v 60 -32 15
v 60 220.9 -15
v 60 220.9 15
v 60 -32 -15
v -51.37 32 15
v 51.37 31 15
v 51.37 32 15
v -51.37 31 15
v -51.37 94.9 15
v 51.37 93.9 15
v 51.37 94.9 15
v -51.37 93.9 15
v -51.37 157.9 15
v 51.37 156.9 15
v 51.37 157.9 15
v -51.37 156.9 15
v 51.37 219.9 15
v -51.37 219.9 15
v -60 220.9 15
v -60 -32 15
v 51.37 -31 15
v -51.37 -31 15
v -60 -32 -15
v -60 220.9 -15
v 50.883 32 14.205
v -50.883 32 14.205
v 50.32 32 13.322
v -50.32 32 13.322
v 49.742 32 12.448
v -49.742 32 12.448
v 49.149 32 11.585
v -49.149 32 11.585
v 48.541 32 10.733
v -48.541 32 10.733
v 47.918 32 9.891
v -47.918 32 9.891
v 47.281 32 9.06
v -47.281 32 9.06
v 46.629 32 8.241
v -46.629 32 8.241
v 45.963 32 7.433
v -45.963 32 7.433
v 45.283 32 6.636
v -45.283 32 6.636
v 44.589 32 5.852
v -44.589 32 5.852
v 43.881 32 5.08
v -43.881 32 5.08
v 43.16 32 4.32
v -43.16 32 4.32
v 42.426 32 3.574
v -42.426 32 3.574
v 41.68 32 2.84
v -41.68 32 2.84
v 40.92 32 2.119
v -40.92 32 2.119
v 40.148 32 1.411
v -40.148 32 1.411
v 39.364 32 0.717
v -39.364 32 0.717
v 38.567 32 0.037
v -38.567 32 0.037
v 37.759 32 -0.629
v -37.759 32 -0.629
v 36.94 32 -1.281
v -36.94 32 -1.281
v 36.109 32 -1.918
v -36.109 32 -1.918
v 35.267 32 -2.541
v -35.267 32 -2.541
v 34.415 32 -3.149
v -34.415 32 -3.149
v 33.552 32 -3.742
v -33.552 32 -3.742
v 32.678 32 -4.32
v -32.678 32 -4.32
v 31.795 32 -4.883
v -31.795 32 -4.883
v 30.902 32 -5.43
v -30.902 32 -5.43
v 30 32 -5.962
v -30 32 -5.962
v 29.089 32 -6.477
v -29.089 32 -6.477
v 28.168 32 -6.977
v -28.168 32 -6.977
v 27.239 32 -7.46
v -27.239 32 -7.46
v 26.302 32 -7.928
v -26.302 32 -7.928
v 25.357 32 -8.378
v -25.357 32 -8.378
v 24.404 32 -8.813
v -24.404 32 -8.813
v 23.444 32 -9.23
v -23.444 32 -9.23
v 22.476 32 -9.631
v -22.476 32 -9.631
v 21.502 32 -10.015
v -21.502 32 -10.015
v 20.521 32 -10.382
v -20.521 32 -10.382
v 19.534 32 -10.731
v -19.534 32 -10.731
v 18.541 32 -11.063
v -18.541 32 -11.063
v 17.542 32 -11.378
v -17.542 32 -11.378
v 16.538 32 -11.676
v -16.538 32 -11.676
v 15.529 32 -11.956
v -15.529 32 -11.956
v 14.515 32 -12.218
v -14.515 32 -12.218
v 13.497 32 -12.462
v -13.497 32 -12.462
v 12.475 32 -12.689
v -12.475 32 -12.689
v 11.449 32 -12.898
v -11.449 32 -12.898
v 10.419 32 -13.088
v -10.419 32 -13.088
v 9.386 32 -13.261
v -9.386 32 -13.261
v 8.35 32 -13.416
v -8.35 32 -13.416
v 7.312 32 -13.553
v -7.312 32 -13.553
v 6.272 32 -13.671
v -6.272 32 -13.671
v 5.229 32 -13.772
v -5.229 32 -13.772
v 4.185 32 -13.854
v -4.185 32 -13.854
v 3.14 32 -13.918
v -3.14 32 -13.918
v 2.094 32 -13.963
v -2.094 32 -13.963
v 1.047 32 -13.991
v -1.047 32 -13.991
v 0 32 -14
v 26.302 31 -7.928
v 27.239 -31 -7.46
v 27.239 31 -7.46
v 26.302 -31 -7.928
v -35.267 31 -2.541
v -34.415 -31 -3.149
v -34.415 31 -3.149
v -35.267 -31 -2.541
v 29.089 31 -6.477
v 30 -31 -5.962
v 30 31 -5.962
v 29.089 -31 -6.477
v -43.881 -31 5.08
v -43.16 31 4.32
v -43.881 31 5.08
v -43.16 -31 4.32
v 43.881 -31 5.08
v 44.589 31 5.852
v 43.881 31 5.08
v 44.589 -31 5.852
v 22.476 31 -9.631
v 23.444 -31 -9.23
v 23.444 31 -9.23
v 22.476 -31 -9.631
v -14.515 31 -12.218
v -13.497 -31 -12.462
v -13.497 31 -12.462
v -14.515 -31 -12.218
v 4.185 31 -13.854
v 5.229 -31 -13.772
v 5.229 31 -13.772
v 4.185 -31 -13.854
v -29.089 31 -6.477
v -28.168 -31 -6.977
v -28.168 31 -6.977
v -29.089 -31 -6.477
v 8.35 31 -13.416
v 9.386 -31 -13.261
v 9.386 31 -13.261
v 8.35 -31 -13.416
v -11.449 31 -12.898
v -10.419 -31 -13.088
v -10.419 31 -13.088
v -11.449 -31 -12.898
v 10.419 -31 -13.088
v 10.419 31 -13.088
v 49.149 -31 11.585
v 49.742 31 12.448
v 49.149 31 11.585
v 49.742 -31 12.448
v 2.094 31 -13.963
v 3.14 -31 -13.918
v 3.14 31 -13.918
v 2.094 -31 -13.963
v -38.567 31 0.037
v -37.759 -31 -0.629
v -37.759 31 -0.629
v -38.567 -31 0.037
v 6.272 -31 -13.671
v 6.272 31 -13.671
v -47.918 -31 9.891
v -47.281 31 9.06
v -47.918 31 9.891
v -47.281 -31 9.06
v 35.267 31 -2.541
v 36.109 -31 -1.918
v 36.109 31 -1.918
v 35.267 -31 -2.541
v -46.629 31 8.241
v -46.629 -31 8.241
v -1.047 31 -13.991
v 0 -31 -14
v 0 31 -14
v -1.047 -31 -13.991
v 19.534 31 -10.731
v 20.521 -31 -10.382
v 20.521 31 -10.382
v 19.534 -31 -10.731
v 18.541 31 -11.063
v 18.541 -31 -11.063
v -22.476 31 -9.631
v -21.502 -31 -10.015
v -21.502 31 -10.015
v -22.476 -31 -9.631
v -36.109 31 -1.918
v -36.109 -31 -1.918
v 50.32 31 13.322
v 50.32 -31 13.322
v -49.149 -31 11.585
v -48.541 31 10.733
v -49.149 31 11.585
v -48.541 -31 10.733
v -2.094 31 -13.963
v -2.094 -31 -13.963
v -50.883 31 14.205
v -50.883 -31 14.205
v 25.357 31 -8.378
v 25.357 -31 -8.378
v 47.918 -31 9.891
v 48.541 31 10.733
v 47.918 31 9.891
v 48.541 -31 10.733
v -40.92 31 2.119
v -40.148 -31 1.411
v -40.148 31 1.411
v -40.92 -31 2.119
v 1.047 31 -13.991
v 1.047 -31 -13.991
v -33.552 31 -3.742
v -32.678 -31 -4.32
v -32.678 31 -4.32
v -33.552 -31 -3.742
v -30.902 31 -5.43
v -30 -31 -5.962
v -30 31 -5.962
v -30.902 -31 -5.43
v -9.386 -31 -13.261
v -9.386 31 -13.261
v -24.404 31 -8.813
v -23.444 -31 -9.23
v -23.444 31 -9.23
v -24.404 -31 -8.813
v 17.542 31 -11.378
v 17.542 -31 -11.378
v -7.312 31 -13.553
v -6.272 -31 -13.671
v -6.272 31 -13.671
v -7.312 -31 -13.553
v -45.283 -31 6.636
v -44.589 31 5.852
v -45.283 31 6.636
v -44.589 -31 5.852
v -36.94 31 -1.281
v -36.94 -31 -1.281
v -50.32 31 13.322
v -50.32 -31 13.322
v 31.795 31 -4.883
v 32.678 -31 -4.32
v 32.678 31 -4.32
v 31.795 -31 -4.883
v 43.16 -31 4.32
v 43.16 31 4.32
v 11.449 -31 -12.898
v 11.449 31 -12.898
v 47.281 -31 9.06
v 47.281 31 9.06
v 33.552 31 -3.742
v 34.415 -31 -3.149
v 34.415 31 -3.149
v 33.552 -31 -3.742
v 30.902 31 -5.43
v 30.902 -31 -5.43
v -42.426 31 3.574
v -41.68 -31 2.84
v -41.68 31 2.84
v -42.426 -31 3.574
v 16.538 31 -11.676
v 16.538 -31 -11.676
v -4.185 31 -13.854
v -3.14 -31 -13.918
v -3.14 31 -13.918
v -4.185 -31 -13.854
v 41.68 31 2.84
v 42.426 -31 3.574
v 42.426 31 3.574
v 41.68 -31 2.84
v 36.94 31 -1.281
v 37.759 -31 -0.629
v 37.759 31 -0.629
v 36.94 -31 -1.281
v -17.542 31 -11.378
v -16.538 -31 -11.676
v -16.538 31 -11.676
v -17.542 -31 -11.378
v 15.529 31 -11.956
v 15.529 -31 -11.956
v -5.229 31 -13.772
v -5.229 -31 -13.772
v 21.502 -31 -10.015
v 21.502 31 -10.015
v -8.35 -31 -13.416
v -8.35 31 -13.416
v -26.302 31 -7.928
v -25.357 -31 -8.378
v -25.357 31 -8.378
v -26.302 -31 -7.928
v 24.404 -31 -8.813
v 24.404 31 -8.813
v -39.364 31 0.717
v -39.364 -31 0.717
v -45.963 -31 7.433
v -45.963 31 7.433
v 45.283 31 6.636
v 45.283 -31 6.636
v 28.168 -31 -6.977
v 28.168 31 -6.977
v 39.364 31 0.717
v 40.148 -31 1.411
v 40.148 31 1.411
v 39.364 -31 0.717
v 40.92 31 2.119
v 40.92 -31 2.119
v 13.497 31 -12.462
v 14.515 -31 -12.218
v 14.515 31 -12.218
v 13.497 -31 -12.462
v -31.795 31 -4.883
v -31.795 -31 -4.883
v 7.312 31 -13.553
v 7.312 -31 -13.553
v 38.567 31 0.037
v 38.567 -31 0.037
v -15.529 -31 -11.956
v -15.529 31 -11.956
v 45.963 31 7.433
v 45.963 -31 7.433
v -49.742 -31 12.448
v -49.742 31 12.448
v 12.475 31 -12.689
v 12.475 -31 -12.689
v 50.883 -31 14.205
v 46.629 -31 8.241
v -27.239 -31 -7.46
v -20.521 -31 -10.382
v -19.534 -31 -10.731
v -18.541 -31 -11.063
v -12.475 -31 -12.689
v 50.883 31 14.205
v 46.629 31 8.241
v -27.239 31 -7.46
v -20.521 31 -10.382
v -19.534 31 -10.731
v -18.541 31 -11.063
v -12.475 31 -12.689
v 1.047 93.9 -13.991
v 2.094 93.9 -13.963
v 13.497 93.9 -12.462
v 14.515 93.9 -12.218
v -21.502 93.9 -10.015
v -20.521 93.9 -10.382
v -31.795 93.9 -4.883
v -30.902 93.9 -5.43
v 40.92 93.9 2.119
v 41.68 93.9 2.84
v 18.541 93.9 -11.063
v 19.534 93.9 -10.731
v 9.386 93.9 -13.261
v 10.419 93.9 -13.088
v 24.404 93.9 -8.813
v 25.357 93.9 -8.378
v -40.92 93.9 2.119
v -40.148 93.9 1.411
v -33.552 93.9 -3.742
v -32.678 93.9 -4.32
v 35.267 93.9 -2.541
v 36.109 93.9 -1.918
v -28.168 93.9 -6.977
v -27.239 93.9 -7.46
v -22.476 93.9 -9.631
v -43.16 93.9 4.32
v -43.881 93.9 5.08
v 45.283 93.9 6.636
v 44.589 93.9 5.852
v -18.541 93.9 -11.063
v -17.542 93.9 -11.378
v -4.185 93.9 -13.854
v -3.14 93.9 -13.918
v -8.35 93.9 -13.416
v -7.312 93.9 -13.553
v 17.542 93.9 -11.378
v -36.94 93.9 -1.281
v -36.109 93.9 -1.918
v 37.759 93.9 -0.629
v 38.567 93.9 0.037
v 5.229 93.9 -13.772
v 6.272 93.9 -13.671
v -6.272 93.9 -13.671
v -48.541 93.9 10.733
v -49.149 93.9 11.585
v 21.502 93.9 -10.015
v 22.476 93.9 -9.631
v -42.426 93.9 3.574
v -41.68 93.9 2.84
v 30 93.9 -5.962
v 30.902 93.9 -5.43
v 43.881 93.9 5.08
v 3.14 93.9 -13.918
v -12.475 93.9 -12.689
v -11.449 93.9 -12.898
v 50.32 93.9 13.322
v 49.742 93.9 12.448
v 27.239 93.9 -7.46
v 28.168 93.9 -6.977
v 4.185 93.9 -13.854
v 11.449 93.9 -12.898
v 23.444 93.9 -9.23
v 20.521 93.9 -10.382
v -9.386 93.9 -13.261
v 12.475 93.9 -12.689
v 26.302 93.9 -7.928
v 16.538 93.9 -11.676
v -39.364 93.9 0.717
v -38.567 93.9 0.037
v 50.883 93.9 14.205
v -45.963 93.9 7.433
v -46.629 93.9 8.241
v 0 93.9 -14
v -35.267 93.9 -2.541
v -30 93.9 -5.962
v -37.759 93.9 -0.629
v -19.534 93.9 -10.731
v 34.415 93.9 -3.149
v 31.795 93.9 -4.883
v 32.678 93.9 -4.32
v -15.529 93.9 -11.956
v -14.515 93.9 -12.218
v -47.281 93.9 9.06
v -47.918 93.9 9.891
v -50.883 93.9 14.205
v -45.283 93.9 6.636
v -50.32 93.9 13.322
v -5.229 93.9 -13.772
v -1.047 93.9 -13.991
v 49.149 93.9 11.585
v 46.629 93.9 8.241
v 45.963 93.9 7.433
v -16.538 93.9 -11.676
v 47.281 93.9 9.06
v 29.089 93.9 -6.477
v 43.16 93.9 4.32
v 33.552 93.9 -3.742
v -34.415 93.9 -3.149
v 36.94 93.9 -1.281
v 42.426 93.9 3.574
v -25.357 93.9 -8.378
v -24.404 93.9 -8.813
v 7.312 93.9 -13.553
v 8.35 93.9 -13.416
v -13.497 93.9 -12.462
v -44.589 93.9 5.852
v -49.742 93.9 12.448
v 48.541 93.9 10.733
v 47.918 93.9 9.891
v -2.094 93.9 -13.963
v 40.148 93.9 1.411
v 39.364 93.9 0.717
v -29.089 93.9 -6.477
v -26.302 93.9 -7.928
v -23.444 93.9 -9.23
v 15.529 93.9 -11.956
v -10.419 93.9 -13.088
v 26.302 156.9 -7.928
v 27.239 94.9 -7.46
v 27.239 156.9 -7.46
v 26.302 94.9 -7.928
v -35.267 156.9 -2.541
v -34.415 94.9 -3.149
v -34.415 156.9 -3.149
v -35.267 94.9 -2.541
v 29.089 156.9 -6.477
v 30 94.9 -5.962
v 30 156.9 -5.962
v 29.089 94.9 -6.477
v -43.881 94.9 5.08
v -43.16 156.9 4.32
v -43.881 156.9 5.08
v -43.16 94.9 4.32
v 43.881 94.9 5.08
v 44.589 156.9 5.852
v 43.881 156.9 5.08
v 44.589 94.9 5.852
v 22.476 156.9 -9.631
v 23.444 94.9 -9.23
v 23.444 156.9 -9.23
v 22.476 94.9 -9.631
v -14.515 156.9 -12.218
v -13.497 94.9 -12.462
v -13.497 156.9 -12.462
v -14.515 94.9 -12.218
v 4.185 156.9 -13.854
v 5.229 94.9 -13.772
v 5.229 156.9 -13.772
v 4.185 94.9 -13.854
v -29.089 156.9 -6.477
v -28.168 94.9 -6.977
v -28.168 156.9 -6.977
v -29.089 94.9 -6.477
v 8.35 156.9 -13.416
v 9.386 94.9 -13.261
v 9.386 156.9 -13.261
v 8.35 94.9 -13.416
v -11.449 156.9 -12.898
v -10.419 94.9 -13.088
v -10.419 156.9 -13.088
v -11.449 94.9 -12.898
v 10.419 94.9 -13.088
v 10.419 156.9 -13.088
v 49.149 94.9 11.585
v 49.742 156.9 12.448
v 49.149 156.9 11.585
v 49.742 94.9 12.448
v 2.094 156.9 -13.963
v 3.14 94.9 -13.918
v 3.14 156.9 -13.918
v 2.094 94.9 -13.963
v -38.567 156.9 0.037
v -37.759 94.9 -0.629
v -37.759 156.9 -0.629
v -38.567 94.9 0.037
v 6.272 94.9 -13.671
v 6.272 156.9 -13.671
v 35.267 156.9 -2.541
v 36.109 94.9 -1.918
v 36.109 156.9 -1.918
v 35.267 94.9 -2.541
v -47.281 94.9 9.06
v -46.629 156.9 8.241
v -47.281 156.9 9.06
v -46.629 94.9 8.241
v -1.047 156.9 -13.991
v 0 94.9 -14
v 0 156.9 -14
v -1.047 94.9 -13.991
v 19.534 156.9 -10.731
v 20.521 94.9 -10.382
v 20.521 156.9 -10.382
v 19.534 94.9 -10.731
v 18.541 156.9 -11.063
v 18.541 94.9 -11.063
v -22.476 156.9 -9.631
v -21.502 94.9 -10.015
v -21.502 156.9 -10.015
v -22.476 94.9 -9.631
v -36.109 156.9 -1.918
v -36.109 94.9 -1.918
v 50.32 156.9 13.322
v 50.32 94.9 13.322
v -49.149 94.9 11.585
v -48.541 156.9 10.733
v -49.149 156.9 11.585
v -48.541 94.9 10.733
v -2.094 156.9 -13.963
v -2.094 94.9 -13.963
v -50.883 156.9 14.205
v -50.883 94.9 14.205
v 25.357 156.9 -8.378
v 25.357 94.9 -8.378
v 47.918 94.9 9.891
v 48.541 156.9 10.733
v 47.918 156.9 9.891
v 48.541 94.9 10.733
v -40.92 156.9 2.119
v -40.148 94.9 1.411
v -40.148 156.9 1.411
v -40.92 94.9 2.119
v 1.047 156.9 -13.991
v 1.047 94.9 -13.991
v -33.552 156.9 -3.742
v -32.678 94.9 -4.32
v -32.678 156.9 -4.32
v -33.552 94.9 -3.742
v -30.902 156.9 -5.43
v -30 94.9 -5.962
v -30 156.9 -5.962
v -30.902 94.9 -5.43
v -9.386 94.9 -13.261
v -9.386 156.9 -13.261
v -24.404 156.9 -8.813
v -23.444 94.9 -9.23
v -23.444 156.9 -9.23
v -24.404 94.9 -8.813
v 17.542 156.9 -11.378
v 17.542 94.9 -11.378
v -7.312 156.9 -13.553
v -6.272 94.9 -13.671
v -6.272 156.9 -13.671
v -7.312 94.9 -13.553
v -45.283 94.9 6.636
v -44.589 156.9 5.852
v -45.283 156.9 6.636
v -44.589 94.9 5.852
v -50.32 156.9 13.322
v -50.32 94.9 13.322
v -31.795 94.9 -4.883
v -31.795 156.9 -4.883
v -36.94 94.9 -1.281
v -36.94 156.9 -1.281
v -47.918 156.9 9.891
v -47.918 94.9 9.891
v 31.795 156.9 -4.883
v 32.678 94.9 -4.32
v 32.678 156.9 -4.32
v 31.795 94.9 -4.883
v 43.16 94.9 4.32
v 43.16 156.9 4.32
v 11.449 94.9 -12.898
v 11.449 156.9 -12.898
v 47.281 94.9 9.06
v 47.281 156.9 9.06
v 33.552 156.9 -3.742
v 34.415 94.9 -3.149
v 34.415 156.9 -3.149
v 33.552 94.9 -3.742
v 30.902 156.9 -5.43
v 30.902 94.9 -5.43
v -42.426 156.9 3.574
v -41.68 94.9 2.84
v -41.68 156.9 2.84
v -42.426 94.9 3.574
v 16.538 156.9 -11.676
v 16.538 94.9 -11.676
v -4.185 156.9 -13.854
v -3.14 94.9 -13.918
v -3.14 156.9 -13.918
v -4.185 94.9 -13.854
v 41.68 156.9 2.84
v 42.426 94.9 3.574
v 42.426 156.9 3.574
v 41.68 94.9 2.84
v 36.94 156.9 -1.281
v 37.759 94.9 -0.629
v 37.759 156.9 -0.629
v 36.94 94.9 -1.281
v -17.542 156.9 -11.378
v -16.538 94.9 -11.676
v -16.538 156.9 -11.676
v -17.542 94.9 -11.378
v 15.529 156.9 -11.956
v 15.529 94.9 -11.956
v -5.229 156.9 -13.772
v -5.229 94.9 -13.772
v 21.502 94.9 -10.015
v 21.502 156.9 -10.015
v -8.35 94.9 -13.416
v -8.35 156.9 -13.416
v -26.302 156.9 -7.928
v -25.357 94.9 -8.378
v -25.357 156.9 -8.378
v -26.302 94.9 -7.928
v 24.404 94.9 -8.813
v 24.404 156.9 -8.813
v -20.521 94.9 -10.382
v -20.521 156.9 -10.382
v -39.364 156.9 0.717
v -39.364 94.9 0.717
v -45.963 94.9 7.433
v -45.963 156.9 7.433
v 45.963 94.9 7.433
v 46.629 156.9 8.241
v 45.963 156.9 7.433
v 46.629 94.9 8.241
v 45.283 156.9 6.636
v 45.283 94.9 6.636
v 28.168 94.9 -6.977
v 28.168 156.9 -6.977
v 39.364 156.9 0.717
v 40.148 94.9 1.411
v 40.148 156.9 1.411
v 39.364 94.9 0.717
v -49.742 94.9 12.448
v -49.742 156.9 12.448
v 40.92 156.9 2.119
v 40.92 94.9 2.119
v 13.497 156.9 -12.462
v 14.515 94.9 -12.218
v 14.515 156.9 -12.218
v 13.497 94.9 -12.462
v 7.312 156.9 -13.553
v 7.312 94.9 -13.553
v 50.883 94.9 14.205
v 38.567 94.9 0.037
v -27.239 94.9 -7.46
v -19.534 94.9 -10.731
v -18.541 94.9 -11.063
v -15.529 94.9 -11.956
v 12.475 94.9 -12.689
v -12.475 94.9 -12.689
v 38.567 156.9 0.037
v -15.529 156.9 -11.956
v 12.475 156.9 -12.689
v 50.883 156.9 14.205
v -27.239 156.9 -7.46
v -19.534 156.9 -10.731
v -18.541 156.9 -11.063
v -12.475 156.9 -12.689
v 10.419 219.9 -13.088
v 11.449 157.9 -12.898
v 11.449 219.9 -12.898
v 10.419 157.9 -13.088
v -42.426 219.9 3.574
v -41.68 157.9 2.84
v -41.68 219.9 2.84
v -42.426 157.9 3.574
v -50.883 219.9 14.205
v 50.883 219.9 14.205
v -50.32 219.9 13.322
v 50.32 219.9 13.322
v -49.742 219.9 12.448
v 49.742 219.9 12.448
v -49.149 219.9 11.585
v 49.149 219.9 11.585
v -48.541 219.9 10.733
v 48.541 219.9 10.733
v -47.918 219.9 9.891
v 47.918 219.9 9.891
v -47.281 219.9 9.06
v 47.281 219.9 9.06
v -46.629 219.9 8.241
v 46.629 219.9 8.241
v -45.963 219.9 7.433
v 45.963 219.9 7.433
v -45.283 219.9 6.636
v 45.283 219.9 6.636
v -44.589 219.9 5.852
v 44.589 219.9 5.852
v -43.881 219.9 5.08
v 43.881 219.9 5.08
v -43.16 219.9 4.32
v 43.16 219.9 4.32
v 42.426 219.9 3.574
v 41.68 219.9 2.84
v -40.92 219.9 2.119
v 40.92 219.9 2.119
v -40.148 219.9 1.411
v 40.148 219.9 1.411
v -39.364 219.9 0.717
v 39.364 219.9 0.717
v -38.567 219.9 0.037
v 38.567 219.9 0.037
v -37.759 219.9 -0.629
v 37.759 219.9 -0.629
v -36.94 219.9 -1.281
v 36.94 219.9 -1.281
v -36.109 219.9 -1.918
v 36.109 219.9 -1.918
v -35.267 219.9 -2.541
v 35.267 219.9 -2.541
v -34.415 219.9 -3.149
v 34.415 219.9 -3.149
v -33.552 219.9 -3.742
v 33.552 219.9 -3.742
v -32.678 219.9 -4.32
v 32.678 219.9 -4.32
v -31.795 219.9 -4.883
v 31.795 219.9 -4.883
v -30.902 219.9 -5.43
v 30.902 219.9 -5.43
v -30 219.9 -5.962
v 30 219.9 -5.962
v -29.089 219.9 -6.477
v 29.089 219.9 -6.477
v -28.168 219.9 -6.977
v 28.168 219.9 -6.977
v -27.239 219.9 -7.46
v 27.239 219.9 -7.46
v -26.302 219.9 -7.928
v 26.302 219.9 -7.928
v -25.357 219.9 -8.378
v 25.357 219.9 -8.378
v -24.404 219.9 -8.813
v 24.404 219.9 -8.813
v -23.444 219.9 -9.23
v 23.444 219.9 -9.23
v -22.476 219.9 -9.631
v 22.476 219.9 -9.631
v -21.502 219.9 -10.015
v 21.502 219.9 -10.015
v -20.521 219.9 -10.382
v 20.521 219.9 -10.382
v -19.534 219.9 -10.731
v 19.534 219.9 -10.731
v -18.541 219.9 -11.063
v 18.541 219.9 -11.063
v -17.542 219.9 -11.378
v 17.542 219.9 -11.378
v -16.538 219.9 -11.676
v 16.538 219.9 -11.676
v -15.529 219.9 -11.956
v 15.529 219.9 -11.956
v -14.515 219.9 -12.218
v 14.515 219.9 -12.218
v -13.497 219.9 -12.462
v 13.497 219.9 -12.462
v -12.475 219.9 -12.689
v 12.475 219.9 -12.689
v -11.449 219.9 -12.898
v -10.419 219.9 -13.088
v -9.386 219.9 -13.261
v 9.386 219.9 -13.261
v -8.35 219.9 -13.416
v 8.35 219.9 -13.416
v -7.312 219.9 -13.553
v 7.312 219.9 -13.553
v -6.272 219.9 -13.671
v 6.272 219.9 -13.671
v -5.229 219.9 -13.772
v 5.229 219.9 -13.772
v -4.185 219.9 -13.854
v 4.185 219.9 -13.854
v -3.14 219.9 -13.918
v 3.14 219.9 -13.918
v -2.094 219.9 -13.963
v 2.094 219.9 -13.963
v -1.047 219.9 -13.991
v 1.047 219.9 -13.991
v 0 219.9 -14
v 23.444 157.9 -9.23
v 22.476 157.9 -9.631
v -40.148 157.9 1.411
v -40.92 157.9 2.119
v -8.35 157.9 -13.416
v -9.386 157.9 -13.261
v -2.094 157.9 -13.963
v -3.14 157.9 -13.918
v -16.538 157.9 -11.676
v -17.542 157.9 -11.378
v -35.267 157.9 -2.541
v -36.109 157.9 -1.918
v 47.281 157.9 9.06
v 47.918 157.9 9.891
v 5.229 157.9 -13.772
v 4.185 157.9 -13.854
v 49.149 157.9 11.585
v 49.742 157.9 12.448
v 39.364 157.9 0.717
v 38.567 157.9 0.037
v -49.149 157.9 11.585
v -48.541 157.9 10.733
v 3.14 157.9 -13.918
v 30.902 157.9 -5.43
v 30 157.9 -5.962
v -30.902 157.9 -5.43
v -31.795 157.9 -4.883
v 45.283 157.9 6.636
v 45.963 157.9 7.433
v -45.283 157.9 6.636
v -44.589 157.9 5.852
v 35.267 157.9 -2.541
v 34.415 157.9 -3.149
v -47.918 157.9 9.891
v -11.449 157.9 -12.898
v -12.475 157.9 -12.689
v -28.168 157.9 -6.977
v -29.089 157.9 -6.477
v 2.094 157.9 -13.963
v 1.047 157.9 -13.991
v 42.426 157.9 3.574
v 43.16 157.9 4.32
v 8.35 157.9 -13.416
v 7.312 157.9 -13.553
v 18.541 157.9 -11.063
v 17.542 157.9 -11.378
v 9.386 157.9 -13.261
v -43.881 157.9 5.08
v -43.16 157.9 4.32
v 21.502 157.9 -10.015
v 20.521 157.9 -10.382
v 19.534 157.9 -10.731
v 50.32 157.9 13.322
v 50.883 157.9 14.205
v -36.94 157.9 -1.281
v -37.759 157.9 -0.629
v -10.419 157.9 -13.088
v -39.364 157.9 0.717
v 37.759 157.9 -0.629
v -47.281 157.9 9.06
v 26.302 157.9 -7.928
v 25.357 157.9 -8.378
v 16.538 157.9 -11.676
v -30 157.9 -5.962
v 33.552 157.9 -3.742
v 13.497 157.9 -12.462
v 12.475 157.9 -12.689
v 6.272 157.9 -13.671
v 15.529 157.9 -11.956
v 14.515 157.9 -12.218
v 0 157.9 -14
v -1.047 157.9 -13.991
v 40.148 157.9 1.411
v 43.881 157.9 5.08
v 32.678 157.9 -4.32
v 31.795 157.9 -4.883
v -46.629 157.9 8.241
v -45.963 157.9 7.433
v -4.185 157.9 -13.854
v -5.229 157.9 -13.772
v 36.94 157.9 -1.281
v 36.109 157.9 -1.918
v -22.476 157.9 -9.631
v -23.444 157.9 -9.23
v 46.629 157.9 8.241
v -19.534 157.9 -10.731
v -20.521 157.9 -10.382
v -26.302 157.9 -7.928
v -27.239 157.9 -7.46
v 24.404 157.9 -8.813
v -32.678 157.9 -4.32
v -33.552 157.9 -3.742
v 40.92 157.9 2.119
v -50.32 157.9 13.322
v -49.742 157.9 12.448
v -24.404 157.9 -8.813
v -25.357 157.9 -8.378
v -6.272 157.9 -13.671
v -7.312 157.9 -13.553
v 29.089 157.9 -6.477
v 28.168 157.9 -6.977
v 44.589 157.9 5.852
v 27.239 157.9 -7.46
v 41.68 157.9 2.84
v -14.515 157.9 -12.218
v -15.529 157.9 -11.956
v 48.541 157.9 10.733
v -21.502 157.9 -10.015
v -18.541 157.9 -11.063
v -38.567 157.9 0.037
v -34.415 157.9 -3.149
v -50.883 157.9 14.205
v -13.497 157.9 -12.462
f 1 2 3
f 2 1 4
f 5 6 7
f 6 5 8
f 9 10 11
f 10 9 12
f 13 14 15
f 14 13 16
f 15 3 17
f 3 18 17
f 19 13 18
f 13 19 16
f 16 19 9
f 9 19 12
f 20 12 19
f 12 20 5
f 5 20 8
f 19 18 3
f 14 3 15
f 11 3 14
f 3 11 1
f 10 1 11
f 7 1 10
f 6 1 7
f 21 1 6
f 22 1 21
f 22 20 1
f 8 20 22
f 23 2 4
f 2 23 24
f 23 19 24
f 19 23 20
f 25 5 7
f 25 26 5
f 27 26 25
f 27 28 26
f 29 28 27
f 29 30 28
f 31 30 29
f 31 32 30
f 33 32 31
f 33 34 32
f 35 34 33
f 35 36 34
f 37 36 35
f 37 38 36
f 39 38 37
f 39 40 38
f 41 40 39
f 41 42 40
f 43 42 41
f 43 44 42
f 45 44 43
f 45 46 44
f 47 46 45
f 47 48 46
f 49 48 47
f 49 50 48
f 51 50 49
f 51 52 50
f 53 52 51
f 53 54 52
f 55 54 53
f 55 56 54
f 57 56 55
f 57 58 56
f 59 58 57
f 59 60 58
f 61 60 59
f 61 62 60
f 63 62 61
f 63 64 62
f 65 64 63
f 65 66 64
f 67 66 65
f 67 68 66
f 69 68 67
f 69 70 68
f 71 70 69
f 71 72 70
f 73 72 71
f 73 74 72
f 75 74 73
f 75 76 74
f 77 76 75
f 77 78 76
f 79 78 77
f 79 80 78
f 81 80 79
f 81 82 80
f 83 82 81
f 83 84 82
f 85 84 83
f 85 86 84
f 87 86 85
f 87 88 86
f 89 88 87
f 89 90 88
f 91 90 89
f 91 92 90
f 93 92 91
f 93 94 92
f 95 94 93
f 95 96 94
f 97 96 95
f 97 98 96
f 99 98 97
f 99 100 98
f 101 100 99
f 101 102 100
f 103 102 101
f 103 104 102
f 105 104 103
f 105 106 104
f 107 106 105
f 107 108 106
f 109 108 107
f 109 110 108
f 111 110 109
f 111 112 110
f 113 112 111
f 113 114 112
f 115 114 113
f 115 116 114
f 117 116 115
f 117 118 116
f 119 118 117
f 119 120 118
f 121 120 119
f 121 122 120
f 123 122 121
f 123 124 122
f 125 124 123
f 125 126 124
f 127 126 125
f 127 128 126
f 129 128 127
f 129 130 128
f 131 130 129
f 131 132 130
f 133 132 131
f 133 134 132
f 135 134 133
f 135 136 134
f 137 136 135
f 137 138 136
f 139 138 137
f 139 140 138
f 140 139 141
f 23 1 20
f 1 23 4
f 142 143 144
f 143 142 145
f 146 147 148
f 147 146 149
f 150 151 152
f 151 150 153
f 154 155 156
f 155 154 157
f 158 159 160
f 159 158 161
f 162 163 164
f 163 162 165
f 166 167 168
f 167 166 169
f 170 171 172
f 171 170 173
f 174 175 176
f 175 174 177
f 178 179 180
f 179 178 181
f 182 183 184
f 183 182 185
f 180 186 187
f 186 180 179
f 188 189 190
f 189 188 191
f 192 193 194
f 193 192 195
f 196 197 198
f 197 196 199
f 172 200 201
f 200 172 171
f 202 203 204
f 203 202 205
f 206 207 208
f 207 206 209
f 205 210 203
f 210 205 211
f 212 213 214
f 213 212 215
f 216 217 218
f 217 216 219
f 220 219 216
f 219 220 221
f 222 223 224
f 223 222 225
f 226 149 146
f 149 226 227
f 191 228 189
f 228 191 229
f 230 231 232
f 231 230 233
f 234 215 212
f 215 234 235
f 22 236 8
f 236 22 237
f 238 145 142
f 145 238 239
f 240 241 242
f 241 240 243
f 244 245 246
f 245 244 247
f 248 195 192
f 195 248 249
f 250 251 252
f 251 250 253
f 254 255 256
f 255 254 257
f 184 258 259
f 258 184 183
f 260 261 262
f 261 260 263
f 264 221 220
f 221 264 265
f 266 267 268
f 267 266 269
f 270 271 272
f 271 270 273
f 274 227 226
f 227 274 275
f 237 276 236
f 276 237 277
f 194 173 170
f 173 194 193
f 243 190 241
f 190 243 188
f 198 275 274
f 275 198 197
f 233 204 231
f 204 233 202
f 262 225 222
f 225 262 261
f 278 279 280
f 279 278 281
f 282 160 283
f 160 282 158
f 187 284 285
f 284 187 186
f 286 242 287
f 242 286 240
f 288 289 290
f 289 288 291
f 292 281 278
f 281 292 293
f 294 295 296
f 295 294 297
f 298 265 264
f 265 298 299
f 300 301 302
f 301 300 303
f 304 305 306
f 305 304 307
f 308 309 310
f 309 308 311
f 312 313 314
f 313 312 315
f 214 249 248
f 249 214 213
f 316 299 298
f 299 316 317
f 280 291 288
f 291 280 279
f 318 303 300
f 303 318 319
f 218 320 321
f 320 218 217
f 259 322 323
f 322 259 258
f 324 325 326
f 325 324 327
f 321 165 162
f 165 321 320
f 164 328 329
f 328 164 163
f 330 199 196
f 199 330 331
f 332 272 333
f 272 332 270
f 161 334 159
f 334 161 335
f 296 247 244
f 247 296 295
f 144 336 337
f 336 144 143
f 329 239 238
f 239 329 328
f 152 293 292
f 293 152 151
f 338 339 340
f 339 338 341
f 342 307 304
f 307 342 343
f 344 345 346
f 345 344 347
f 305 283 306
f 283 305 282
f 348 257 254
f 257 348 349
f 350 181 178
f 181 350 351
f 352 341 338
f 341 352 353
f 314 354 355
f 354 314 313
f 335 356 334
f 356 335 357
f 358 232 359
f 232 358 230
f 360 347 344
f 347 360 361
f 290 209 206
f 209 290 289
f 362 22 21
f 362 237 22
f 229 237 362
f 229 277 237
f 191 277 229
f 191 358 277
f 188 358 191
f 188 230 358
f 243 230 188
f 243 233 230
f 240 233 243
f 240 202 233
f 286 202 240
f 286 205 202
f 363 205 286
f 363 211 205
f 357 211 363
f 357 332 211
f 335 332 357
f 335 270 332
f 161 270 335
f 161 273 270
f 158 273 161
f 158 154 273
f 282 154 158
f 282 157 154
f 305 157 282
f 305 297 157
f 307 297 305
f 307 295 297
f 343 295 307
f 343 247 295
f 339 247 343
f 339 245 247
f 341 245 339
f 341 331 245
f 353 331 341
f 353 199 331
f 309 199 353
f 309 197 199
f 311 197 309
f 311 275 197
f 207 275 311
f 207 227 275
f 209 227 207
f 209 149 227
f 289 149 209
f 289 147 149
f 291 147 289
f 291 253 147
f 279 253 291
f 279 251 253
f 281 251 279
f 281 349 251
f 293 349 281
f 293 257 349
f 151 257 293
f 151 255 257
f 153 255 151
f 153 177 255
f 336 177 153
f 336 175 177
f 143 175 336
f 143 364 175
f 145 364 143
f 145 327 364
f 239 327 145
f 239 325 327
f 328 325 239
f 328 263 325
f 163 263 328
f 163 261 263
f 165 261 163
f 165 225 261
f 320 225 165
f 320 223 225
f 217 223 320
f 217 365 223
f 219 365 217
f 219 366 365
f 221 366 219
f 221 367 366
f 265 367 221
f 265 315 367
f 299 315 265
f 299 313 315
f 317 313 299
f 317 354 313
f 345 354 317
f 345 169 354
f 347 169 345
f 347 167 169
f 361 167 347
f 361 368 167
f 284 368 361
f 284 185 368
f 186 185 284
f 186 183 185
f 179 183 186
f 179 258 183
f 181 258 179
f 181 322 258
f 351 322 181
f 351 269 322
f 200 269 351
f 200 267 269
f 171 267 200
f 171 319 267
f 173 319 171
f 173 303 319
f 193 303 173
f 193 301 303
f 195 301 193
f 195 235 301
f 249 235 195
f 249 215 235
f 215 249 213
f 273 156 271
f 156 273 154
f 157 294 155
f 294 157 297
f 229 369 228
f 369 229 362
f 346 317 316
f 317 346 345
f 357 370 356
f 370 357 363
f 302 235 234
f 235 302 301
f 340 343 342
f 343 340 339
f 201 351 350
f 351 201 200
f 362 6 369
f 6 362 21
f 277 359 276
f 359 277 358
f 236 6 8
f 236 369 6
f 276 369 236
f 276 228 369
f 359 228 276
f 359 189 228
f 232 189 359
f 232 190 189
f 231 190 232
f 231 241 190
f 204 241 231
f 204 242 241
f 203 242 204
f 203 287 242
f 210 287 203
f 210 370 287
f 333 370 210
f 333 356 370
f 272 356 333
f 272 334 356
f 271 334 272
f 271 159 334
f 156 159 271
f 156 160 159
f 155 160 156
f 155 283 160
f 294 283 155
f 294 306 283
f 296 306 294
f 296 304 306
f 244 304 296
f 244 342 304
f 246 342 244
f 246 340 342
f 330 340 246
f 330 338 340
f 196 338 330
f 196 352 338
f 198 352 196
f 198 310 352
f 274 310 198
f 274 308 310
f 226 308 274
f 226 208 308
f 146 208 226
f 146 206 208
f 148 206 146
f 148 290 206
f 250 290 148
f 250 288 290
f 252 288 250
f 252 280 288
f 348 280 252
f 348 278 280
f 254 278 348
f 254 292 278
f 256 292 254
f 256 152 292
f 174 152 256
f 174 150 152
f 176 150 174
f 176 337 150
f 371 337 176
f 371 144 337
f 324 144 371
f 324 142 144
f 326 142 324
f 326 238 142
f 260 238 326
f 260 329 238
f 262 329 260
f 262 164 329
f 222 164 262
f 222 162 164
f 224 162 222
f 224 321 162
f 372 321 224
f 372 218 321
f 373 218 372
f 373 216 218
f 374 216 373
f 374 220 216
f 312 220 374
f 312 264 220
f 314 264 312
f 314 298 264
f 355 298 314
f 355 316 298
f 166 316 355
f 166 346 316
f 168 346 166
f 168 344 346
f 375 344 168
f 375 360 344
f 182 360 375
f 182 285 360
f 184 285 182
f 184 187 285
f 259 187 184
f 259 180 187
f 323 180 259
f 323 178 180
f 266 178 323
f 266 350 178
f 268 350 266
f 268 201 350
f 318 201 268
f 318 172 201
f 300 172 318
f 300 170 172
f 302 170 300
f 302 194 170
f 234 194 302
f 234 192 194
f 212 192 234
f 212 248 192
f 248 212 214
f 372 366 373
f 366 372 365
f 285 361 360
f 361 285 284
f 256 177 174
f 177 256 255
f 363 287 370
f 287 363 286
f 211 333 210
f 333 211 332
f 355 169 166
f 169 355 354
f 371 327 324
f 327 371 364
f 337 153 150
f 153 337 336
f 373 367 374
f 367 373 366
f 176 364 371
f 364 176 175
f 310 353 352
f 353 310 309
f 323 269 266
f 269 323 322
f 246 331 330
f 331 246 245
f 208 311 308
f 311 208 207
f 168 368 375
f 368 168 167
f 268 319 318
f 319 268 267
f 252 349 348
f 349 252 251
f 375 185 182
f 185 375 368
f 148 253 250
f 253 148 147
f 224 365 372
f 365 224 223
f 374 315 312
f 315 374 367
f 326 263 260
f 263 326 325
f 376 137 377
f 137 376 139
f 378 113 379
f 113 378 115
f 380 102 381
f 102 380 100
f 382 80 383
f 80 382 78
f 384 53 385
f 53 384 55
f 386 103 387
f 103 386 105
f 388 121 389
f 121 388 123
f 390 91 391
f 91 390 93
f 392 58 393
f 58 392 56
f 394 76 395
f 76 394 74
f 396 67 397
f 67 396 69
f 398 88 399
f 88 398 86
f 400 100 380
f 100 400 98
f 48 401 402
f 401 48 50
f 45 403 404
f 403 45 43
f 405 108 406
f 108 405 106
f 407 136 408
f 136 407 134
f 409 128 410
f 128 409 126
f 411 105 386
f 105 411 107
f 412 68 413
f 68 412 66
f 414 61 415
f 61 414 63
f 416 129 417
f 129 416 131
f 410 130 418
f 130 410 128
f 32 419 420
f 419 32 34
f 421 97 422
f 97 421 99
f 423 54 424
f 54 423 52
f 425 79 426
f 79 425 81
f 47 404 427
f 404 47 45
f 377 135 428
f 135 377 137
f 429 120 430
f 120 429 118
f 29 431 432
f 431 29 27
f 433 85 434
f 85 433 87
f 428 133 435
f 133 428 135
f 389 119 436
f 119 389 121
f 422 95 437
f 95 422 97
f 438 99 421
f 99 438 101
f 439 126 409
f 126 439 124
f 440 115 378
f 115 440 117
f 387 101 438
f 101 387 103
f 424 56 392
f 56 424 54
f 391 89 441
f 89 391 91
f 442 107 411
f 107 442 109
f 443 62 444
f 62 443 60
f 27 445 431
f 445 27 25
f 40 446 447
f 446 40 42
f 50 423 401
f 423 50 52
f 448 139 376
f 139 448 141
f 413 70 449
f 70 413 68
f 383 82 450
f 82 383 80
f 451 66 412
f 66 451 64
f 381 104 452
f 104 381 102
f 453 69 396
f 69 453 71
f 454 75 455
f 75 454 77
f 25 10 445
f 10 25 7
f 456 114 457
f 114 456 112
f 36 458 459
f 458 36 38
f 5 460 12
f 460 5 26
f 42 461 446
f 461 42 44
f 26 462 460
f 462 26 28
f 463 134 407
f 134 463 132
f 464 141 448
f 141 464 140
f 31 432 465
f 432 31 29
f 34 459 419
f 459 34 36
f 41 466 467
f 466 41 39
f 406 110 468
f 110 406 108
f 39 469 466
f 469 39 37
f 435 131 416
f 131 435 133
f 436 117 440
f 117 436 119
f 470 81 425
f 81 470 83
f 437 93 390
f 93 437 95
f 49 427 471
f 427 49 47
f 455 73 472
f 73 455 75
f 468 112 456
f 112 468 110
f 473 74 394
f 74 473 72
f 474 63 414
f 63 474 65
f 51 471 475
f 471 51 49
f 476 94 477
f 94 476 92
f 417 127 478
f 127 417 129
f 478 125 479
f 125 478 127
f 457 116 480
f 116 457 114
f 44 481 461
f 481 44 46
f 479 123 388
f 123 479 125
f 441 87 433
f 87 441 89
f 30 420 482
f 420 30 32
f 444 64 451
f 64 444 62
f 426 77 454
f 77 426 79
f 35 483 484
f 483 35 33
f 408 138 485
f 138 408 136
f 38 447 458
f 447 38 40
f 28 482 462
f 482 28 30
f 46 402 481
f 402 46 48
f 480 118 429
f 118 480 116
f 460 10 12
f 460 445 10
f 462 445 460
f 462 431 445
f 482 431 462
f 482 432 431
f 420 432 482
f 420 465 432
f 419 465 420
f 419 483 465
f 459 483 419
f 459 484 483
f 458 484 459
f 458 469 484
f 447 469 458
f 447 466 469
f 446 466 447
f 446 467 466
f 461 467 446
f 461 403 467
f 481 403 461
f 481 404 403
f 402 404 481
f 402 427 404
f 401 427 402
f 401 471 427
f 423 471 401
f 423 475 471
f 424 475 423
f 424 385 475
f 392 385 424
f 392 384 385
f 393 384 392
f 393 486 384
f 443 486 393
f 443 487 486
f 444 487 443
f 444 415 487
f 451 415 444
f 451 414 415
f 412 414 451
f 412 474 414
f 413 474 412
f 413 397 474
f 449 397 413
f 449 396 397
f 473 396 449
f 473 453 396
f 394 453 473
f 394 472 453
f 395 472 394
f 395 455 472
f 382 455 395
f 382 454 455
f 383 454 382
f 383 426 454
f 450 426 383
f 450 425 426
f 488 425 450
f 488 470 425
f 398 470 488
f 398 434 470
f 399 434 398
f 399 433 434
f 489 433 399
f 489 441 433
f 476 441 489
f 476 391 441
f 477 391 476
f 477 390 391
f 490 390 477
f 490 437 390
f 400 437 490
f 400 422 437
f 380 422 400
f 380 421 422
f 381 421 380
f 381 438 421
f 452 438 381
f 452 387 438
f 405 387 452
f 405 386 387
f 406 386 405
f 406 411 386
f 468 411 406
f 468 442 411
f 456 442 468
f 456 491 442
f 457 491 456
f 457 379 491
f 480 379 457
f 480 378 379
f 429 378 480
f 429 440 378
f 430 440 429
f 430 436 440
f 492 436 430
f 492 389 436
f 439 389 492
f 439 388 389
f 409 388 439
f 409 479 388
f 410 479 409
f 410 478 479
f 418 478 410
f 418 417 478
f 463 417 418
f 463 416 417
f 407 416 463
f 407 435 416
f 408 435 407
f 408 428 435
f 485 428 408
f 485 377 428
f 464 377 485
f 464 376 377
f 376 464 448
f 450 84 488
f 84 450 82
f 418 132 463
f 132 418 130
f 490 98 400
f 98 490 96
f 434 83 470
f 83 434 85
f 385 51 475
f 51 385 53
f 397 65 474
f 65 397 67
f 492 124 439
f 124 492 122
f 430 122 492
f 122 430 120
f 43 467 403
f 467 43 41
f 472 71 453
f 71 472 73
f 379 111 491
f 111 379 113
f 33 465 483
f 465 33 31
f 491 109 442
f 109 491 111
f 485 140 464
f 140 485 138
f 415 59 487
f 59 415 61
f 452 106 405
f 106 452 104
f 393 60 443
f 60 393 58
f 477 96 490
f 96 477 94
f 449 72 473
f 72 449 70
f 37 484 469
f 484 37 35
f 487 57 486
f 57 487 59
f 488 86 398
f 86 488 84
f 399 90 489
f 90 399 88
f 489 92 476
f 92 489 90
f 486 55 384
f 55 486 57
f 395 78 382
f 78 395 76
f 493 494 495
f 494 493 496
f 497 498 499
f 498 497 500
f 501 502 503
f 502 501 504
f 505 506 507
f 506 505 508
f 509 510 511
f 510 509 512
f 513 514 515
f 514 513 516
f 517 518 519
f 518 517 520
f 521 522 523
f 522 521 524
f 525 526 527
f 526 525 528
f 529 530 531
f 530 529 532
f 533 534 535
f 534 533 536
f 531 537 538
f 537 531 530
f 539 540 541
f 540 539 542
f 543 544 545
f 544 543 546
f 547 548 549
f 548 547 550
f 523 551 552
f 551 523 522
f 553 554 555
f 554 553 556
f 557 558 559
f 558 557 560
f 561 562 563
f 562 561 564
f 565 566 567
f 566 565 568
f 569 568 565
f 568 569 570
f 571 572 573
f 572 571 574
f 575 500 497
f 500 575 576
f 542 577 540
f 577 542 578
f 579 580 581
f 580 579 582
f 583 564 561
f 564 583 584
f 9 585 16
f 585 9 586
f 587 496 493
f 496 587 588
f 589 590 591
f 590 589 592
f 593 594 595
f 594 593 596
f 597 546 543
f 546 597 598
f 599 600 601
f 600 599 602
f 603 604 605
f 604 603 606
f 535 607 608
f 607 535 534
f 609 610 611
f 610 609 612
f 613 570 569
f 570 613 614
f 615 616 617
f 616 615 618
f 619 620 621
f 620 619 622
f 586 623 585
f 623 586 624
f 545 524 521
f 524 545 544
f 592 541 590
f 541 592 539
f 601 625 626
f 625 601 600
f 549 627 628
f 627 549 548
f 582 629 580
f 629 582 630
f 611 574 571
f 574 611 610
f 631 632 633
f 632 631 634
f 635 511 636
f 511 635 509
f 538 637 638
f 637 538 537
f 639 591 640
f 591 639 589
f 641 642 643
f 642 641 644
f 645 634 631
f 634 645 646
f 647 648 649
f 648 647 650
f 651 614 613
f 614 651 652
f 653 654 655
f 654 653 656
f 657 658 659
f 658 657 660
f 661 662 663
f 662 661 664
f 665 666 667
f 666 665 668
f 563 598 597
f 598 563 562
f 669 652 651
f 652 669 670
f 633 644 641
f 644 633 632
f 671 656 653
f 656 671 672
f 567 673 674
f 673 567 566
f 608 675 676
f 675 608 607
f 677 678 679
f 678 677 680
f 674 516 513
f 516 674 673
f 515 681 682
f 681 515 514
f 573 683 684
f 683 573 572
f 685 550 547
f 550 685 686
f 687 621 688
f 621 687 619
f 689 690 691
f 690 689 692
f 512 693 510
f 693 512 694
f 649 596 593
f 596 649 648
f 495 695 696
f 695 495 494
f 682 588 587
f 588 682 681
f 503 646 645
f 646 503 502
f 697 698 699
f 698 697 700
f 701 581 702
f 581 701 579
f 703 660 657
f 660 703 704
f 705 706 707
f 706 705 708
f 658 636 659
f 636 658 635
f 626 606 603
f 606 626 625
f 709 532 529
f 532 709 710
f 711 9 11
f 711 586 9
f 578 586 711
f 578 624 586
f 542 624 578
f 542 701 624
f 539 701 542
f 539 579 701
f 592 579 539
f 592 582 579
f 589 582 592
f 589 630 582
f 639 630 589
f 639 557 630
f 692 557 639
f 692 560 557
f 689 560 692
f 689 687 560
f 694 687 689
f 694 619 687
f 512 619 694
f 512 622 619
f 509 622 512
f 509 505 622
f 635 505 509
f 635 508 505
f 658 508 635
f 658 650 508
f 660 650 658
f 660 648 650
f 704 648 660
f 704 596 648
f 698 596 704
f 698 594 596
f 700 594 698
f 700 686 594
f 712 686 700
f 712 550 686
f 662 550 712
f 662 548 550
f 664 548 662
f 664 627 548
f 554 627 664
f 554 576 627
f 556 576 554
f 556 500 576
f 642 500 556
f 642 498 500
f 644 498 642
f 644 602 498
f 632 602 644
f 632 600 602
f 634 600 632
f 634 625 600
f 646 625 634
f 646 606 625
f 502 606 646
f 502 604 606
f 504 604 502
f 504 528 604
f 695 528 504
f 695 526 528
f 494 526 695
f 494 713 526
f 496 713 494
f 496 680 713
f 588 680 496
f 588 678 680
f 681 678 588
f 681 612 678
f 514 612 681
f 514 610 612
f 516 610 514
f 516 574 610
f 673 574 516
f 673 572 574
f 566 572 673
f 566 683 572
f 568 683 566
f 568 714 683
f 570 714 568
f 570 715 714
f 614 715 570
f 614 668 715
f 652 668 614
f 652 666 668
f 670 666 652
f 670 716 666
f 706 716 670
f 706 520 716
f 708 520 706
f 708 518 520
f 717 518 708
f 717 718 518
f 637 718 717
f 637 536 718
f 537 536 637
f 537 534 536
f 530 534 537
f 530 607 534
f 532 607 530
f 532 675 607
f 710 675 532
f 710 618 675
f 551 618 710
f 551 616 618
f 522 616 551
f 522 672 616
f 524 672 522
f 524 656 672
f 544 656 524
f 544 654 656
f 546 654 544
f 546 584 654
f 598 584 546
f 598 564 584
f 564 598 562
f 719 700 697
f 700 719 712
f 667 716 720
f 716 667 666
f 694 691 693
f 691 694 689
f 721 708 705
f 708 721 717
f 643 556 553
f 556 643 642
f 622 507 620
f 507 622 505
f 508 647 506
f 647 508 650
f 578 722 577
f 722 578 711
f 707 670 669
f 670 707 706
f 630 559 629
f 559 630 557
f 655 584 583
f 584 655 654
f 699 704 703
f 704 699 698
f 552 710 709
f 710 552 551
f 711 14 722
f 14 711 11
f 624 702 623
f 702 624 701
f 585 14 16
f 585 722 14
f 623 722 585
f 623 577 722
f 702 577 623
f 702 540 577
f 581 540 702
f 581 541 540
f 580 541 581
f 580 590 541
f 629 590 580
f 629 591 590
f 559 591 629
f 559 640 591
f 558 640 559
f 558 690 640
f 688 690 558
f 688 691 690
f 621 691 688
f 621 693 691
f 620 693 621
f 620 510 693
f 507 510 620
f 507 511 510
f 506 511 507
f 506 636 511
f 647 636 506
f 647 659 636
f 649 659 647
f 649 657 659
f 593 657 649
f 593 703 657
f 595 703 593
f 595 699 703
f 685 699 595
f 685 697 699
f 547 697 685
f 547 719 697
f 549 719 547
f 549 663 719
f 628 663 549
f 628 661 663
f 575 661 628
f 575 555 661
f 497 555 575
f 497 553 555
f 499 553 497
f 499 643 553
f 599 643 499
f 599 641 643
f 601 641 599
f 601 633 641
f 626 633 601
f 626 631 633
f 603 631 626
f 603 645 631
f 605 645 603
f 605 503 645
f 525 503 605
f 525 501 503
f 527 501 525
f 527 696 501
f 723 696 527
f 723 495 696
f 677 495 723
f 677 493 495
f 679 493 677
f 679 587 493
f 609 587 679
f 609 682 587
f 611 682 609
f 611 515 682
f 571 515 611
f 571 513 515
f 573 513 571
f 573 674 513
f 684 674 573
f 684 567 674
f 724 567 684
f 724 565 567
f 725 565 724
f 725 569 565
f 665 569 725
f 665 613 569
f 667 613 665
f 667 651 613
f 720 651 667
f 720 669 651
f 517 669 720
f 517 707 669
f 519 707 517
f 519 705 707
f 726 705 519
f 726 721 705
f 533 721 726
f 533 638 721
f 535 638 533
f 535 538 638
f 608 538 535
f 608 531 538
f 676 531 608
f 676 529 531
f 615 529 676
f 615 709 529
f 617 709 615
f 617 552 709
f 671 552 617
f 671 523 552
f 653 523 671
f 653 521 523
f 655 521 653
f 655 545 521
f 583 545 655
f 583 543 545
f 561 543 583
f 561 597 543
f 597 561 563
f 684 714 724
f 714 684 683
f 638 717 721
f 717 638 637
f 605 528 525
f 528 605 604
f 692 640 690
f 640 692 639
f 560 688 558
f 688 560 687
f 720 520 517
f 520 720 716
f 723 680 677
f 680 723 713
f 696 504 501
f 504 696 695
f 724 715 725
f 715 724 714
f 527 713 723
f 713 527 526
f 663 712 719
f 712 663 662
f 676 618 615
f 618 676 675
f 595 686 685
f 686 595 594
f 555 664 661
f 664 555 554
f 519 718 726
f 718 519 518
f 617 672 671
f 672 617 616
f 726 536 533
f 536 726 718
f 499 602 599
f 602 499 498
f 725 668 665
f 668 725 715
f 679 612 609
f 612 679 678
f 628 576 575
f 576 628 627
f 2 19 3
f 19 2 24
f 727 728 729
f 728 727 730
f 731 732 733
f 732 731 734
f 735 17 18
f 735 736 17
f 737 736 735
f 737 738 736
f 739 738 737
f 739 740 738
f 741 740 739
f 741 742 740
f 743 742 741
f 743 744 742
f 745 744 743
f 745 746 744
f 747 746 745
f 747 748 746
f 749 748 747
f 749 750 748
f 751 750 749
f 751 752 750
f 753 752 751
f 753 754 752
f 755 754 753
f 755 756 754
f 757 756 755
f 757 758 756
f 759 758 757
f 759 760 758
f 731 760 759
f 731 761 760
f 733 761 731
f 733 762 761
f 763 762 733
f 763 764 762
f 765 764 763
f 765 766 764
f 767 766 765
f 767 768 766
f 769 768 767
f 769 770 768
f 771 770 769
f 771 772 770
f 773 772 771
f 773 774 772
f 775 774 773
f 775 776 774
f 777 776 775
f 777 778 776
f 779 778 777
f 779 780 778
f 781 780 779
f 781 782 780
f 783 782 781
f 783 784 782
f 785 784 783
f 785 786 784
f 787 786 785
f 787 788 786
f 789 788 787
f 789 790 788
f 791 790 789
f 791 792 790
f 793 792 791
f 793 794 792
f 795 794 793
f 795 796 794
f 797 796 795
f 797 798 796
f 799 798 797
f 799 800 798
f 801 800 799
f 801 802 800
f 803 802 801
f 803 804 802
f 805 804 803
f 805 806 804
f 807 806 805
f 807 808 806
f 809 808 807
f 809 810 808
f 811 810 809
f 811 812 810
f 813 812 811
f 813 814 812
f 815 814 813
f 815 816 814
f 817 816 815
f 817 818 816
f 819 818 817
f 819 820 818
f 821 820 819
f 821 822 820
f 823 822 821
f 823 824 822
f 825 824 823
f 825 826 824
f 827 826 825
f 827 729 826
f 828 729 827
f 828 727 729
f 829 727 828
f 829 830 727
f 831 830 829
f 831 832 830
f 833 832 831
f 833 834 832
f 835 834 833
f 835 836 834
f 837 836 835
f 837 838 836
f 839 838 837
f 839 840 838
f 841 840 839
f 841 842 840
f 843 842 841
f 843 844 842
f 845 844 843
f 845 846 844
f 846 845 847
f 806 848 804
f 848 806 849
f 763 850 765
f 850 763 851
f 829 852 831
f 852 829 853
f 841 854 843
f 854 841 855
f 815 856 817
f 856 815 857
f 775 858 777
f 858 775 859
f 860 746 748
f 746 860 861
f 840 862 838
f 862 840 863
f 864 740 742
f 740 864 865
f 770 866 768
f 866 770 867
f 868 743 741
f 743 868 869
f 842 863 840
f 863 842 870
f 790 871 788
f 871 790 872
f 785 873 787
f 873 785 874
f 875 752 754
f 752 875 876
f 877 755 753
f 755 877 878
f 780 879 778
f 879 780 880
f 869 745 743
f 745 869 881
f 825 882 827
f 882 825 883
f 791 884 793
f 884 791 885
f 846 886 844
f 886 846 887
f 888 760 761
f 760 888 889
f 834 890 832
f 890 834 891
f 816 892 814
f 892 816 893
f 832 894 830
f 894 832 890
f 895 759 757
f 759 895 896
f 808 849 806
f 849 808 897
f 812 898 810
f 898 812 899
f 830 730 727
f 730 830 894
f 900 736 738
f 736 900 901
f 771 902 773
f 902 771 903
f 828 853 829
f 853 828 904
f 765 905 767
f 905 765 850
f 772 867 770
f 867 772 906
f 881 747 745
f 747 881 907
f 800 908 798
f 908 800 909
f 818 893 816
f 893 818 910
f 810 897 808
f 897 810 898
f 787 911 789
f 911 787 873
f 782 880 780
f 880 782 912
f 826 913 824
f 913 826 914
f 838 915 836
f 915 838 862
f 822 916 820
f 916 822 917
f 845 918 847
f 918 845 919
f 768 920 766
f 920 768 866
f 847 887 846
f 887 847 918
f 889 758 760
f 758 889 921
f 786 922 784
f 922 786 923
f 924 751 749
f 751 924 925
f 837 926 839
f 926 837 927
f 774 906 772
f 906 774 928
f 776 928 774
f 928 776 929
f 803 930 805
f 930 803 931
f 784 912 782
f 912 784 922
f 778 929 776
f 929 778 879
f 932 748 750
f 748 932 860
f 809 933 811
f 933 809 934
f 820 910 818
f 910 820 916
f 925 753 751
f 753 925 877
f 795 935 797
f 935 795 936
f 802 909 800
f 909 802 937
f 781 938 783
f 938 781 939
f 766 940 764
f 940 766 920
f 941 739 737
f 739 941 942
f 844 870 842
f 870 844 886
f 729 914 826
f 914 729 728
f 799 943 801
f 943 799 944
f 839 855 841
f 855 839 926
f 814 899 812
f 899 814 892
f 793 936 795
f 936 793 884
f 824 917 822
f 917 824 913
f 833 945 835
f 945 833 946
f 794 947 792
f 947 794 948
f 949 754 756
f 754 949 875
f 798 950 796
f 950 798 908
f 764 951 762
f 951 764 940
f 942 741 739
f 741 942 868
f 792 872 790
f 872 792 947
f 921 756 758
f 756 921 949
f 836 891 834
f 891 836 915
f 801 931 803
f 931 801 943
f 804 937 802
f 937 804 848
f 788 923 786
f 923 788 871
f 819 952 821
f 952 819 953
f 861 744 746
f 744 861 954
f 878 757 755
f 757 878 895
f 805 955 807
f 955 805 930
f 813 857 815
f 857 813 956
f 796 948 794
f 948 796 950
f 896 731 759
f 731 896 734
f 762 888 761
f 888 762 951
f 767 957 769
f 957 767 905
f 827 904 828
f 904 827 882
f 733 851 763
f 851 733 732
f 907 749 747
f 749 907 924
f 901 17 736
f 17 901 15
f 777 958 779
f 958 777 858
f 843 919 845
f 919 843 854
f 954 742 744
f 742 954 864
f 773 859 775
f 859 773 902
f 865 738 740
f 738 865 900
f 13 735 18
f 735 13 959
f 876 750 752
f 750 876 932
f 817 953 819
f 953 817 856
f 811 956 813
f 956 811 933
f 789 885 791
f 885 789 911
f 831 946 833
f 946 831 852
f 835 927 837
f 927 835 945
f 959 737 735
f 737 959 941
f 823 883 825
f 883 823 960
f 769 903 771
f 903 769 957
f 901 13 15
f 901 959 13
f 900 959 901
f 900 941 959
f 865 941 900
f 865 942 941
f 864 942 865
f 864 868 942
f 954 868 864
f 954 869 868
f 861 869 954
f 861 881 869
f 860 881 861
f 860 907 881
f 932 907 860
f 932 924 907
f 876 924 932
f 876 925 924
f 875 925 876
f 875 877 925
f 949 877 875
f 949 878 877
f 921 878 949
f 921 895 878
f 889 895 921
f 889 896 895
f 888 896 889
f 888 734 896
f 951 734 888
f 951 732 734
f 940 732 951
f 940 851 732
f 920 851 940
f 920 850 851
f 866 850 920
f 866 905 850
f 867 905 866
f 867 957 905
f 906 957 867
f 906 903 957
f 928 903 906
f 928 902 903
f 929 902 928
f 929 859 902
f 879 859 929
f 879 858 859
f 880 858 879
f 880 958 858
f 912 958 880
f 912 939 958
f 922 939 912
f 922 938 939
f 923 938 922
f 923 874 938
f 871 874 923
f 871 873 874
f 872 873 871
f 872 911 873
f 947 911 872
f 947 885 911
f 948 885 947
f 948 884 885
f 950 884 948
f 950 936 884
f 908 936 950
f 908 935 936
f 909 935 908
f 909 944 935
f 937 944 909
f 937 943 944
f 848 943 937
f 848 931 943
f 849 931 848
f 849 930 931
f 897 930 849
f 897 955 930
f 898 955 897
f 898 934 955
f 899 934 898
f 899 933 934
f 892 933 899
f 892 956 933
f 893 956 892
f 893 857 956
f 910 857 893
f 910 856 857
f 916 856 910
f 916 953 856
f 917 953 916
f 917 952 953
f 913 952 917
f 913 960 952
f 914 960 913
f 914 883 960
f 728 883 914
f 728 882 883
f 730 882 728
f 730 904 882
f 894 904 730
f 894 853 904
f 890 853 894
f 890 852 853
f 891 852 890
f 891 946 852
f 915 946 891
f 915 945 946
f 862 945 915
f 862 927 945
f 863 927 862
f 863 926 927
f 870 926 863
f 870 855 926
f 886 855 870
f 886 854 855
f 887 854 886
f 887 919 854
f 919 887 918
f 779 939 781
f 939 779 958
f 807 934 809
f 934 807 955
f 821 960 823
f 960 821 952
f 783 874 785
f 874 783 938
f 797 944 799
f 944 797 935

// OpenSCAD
// file: BOSL2/std.scad
// Minimal BOSL2 compatibility shim for bundled gallery models.
// It implements only the helpers used by the imported OpenSCAD projects.

CENTER = [0, 0, 0];
BOTTOM = [0, 0, -1];
TOP = [0, 0, 1];
LEFT = [-1, 0, 0];
RIGHT = [1, 0, 0];
FRONT = [0, -1, 0];
BACK = [0, 1, 0];

module up(z=0) {
    translate([0, 0, z]) children();
}

module down(z=0) {
    translate([0, 0, -z]) children();
}

module attach(anchor=CENTER) {
    children();
}

module cuboid(size=[1, 1, 1], anchor=CENTER) {
    center = anchor == CENTER;
    translate(center ? [0, 0, 0] : [0, 0, size[2] / 2])
        cube(size, center=true);
    children();
}

module xcyl(h=1, r=1, anchor=CENTER) {
    center = anchor == CENTER;
    translate(center ? [0, 0, 0] : [h / 2, 0, 0])
        rotate([0, 90, 0])
            cylinder(h=h, r=r, center=true);
}
// main file
// 
// A rack that holds round glass containers, such as Anchor Hocking food storage container, in a vertical position.
//

include <BOSL2/std.scad>

// 3D Model Resolution.  
$fa = 1;
$fs = 0.4;

// *** Model Parameters ***

// Diameter of the glass container
container_diameter = 120;

// Height of the glass container
container_height = 62;

// Wall thickness of the rack.  This is the space from the cutout of the container around all edges.
wall_thickness = 1;

// Number of glass containers per row.
num_containers_per_row = 4;

// *** "Private" variables ***

base_width = container_diameter;
base_depth = container_height + (2 * wall_thickness);
base_height = container_diameter * 0.25; // Height of the base is 25% of the container diameter

segment_overlap = 0.1;

// 
// Creates a single rack for a glass container
//
module glass_container_base(row) {
    y_offset = (row * (base_depth));
    corner_rounding = 2;

    if (num_containers_per_row > 1) 
    {
        if (row == 0) {
            // First Row
            echo("First Row");
            round_except = [BOTTOM, BACK];
            make_base_segment(y_offset = y_offset, 
                corner_rounding = corner_rounding, 
                round_except = round_except, 
                segment_depth = base_depth);
        } else if (row == (num_containers_per_row - 1)) {
            // Last Row
            echo("Last Row");
            round_except = [BOTTOM, FRONT];
            last_y_offset = ((row * (base_depth - wall_thickness)) - segment_overlap);
            make_base_segment(
                y_offset = last_y_offset, 
                corner_rounding = corner_rounding, 
                round_except = round_except,
                segment_depth = base_depth
            );
        } else {
            // Middle Rows
            echo("Middle Row");
            round_except = [BOTTOM, FRONT, BACK];
            middle_y_offset = ((row * (base_depth - wall_thickness)) - segment_overlap);
            make_base_segment(
                y_offset = middle_y_offset, 
                corner_rounding = corner_rounding, 
                round_except = round_except,
                segment_depth = base_depth - wall_thickness
            );
        }
    } else {
        // There is only one row.
        corner_rounding = 2;
        round_except = [BOTTOM];
        make_base_segment(y_offset = y_offset, 
            corner_rounding = corner_rounding, 
            round_except = round_except,
            segment_depth = base_depth);
    }

}

//
// makes a single base segment for the specified row.
//
module make_base_segment(y_offset, corner_rounding, round_except, segment_depth) {

    echo("Creating base segment at y_offset: ", y_offset);
    echo("segment_depth: ", segment_depth);

    difference() {
        translate([0, y_offset, 0])
            cuboid([base_width, segment_depth, base_height],
                    rounding=corner_rounding, except=round_except);

        z_offset = ((container_diameter / 2) + wall_thickness) - (base_height / 2);
        translate([0, y_offset , z_offset])
            rotate([90, 0, 0]) 
                cylinder(d=container_diameter, h=container_height, anchor=LEFT + FRONT, center=true);
    }

}

//
// Creates the cutout for the glass container in the base.
//
module glass_container_cutout(row) {
    y_offset = (row * base_depth) - (row * wall_thickness);
    z_offset = ((container_diameter / 2) + wall_thickness) - (base_height / 2);

    translate([0, y_offset, z_offset])
        rotate([90, 0, 0]) 
            cylinder(d=container_diameter, h=container_height, anchor=LEFT + FRONT, center=true);
}

//
// Main function build the model in its entirety.
//
module build_model() {
    // Loop through rows to create the base and cutouts for each container
    for (row = [0:num_containers_per_row - 1]) {
        glass_container_base(row);
    }
}

// Build the model
build_model();
